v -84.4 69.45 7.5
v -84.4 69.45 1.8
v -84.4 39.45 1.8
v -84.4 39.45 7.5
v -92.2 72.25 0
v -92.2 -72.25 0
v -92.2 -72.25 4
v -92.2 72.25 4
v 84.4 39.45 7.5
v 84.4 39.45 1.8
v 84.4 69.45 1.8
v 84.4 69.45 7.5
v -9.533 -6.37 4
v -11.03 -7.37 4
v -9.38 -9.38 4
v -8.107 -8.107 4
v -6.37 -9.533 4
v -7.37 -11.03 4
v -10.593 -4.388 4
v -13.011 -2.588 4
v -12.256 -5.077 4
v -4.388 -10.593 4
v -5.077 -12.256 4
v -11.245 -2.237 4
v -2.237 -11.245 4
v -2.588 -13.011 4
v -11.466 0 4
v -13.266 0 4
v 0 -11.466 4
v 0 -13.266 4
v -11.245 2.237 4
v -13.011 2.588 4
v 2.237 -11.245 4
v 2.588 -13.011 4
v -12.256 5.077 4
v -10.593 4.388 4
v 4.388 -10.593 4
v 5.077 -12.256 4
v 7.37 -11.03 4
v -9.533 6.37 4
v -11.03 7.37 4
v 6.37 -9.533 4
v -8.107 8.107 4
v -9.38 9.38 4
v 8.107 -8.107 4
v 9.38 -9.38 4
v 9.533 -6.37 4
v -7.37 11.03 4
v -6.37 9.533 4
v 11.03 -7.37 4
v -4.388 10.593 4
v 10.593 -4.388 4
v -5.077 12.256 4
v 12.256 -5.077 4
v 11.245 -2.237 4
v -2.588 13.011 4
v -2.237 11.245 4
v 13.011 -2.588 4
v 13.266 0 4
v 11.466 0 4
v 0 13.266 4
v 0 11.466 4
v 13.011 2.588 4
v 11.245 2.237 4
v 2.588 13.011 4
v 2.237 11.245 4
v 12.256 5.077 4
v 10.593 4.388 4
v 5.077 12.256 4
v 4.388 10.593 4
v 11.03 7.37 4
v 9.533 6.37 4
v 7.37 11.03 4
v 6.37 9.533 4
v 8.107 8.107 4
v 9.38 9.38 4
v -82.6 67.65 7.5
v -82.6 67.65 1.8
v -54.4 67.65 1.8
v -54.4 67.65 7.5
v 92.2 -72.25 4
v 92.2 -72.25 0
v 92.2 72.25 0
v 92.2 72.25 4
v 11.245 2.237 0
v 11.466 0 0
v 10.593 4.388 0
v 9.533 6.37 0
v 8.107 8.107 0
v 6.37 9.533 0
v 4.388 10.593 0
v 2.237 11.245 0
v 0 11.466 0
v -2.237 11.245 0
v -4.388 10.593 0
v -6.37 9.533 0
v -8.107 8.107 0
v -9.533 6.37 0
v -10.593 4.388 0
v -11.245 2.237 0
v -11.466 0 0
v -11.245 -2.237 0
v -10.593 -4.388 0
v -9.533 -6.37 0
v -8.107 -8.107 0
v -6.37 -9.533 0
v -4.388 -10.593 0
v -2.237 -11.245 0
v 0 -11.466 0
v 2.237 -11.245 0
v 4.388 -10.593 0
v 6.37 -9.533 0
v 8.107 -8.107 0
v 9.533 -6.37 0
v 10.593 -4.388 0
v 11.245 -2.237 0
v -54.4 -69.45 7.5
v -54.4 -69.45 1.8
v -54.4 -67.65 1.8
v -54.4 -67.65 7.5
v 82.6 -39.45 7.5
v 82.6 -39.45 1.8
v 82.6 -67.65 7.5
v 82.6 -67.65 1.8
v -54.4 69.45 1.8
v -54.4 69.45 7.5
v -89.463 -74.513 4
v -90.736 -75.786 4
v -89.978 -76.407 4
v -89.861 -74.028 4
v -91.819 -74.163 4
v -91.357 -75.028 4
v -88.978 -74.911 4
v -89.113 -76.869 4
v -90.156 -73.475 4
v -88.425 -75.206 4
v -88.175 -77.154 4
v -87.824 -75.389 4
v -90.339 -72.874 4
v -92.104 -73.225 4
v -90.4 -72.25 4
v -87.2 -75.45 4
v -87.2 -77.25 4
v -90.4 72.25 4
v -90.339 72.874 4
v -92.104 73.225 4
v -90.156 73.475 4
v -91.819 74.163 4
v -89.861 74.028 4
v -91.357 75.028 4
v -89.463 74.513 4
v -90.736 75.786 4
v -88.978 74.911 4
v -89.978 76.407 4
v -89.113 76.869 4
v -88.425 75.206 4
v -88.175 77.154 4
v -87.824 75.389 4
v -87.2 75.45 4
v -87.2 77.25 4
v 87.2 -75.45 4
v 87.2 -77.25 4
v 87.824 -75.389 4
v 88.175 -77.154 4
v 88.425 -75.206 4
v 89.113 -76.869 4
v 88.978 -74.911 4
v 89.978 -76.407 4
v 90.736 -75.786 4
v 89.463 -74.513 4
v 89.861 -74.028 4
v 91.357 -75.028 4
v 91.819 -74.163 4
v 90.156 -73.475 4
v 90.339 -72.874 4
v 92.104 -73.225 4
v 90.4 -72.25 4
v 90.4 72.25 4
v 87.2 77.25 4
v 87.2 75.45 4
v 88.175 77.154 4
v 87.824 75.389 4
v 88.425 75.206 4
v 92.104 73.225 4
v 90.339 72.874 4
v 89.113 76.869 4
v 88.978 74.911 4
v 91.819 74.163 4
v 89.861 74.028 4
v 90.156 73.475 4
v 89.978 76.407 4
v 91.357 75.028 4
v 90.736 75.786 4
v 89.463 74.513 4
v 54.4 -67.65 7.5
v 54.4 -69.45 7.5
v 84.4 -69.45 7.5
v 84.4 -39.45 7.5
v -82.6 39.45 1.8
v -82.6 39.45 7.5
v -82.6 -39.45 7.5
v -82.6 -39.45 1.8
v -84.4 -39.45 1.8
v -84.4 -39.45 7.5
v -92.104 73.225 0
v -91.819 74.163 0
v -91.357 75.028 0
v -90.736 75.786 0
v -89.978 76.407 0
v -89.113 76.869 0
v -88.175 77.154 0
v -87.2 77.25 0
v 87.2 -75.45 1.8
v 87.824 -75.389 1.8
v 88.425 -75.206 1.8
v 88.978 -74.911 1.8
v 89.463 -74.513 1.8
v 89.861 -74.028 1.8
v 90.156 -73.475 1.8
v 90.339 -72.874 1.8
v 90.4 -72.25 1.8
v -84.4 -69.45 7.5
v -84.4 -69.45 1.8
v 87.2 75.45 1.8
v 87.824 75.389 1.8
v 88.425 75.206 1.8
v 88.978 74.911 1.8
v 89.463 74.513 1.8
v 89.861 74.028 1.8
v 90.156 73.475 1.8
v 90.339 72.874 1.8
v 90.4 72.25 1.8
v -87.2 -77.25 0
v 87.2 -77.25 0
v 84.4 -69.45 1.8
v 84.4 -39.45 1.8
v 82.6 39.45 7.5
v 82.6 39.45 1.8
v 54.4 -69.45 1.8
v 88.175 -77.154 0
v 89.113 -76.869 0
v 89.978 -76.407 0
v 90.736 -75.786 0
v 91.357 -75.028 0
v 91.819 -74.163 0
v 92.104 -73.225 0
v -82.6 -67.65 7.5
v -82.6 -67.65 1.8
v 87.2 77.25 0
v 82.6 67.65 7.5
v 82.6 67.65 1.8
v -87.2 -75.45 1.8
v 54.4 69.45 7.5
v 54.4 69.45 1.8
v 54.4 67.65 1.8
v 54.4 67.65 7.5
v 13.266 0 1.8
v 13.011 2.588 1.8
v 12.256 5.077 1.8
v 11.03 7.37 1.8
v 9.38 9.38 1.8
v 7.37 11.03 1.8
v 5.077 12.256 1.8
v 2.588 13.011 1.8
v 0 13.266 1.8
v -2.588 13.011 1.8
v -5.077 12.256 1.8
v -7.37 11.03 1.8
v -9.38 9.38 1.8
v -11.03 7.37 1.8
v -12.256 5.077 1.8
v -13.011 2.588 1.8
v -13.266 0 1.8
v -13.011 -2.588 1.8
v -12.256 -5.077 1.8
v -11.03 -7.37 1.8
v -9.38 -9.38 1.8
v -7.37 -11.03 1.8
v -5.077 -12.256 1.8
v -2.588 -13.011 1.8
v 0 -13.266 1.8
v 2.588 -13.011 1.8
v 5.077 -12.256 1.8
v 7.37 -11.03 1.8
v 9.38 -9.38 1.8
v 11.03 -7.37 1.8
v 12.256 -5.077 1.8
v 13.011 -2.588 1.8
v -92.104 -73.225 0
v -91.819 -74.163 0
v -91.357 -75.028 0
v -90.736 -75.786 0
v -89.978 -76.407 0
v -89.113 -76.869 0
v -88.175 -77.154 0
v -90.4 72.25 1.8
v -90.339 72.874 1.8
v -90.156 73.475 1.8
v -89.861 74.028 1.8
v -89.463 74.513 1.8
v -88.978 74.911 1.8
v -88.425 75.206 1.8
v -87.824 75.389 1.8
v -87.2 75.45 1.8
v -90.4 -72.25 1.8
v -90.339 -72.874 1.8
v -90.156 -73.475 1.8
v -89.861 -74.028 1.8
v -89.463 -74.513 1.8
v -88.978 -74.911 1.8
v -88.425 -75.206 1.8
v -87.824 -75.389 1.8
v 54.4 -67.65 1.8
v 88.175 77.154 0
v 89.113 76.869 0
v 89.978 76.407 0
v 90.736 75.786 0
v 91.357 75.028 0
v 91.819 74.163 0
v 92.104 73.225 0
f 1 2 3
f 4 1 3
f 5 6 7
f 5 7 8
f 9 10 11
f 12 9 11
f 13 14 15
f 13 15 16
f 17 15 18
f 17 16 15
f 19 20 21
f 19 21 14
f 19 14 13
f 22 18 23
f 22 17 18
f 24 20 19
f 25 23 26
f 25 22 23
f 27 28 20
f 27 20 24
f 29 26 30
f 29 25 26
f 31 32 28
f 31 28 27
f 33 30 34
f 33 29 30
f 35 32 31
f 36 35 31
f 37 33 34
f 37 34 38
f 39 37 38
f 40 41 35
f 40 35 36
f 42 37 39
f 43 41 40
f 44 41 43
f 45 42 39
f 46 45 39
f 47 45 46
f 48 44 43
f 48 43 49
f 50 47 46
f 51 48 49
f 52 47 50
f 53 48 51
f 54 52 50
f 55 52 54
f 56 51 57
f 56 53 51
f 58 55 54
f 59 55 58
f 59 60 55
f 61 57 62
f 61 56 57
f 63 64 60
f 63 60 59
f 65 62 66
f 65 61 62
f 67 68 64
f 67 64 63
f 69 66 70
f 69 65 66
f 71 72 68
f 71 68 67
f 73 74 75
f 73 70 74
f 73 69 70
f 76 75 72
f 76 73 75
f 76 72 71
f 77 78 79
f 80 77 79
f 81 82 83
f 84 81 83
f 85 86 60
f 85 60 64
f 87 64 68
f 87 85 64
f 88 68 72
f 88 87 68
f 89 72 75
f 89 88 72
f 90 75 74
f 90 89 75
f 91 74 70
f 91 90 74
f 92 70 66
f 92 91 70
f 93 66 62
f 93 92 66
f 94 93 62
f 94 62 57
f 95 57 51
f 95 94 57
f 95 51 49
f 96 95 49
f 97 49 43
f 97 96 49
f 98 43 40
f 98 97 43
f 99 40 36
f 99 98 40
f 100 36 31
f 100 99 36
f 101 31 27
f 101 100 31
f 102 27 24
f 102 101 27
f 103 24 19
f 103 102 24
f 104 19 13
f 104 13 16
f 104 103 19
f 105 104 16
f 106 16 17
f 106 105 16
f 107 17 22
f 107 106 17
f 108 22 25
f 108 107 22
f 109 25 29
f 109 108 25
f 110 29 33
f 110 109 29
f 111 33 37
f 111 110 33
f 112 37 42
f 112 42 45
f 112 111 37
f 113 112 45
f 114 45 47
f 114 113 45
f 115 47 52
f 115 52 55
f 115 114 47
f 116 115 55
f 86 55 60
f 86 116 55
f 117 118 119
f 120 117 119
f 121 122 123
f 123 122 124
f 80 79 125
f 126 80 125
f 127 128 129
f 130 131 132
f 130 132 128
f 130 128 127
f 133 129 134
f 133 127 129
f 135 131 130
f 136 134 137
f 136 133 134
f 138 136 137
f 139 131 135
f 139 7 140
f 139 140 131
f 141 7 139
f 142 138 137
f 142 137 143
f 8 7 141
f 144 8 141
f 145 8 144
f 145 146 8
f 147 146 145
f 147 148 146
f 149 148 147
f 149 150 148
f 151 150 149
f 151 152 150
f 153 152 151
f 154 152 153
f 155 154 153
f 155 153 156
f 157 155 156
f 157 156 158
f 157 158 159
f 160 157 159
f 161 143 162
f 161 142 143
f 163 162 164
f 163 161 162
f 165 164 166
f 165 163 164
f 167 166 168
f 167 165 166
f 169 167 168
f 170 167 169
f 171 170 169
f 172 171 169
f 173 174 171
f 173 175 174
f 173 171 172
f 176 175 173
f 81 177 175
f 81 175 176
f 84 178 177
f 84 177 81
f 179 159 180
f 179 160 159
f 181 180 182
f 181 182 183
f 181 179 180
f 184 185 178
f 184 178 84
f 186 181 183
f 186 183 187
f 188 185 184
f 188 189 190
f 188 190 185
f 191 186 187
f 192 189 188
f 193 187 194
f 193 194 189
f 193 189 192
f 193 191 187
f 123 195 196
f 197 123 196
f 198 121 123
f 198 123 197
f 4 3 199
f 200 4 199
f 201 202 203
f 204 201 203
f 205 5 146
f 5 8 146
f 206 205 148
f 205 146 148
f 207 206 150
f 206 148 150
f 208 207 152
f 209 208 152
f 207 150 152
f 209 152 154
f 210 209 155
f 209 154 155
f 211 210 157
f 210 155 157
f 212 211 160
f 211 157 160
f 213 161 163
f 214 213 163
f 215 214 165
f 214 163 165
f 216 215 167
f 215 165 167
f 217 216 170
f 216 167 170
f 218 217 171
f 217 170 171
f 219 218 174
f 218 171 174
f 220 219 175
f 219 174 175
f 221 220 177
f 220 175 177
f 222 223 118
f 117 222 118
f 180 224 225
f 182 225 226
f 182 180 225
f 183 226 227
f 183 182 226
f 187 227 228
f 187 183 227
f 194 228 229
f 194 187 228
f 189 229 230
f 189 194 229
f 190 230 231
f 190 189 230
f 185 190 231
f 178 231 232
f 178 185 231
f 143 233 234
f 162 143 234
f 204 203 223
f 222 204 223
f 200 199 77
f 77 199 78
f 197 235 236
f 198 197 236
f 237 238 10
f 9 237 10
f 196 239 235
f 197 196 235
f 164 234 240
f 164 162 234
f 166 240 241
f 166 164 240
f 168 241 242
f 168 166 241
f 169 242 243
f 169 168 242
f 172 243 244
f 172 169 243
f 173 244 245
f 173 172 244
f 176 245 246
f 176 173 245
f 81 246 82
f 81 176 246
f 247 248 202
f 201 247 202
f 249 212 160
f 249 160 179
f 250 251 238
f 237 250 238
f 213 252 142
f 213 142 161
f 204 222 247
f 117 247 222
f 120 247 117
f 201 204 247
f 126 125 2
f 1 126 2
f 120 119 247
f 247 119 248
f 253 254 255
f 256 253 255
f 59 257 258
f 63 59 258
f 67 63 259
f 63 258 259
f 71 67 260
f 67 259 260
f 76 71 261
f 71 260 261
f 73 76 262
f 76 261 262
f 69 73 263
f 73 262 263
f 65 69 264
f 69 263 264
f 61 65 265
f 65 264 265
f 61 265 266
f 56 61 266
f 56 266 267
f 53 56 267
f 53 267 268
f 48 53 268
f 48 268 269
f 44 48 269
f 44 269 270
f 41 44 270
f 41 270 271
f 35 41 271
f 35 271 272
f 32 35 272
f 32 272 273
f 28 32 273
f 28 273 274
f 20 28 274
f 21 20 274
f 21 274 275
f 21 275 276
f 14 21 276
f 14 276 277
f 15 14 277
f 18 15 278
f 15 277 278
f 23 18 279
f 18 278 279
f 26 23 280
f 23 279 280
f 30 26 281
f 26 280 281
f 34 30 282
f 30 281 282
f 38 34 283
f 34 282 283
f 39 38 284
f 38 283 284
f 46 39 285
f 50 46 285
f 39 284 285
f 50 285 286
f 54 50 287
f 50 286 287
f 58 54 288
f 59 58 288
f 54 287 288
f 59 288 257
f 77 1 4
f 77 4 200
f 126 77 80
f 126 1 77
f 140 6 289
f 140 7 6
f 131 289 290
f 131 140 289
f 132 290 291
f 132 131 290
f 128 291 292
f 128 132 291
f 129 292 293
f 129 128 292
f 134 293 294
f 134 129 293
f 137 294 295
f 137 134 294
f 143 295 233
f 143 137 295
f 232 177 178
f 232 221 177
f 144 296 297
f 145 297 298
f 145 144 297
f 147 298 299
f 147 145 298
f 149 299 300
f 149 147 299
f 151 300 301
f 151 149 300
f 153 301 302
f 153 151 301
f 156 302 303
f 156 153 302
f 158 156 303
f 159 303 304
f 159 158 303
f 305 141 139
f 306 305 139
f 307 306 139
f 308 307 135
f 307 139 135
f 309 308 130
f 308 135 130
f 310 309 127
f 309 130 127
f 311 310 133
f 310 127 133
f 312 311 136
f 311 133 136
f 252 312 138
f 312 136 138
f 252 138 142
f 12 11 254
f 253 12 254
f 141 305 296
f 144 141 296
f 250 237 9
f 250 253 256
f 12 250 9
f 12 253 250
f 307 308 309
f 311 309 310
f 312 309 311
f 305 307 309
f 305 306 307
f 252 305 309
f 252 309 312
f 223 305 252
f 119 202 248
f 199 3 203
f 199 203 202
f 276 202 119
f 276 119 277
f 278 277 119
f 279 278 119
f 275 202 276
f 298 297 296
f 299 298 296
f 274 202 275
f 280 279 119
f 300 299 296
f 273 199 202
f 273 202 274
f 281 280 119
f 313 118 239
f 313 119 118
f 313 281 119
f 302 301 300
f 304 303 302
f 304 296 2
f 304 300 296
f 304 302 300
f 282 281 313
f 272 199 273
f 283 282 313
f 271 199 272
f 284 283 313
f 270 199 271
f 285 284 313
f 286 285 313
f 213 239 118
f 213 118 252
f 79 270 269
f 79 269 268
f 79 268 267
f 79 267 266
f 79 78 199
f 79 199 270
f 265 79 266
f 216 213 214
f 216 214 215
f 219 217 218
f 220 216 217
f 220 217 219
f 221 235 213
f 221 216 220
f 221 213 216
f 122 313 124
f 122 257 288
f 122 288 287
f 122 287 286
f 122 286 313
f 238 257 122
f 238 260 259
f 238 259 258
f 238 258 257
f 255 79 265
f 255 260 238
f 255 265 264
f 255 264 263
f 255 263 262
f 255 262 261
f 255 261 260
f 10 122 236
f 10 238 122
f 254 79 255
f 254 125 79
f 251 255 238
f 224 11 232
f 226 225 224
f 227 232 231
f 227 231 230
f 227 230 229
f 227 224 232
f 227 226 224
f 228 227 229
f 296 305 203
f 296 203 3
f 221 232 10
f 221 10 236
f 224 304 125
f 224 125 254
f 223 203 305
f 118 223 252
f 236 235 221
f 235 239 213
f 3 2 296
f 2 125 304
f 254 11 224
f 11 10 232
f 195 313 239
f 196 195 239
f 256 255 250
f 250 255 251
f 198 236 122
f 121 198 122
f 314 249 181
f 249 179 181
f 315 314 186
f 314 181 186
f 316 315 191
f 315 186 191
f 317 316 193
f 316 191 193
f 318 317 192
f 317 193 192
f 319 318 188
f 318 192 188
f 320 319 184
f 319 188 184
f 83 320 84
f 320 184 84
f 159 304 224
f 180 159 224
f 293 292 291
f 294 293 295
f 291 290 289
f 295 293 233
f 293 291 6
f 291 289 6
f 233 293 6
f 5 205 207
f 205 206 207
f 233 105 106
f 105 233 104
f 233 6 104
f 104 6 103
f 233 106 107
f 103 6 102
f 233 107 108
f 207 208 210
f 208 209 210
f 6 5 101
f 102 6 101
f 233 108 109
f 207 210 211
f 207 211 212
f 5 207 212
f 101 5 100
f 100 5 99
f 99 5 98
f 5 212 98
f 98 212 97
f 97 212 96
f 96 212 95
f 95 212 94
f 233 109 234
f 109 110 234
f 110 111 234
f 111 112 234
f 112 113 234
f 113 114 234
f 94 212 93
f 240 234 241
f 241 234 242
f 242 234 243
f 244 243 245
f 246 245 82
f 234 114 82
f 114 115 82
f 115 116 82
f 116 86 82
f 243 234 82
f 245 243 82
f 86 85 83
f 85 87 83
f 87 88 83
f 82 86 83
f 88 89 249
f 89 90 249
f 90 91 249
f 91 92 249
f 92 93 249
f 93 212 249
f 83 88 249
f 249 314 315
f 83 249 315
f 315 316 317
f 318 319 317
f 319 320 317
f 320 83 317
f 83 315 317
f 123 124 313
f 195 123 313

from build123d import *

# Parameters (mm, degrees)
F0_W     = 184.4
F0_H     = 154.5
F0_R     = 11.46558
F1_DEPTH = 4
F2_R     = 5
F3_T     = -1.8
F5_DEPTH = 5.7


with BuildPart() as f1:
    # F0 (on Top) → F1 (new body)
    with BuildSketch(Plane.XY):
        Rectangle(F0_W, F0_H)
        Circle(F0_R, mode=Mode.SUBTRACT)
    extrude(amount=F1_DEPTH)

    # F2
    f2_edges = [f1.edges().sort_by_distance(p)[0] for p in [
        (-92.2, -77.25, 2),
        (-92.2, 77.25, 2),
        (92.2, -77.25, 2),
        (92.2, 77.25, 2),
    ]]
    fillet(f2_edges, radius=F2_R)

    # F3
    f3_openings = [f1.faces().sort_by_distance(p)[0] for p in [
        (0, 74.844307, 4),
    ]]
    offset(amount=F3_T, openings=f3_openings)

    # F4 (on face) → F5 (join)
    with BuildSketch(Plane.XY.offset(1.8)):
        Polygon((-84.4, -39.45), (-84.4, -69.45), (-54.4, -69.45), (-54.4, -67.65), (-82.6, -67.65), (-82.6, -39.45), align=None)
        Polygon((-82.6, 67.65), (-54.4, 67.65), (-54.4, 69.45), (-84.4, 69.45), (-84.4, 39.45), (-82.6, 39.45), align=None)
        Polygon((84.4, -69.45), (84.4, -39.45), (82.6, -39.45), (82.6, -67.65), (54.4, -67.65), (54.4, -69.45), align=None)
        Polygon((82.6, 39.45), (84.4, 39.45), (84.4, 69.45), (54.4, 69.45), (54.4, 67.65), (82.6, 67.65), align=None)
    extrude(amount=F5_DEPTH)


solid = f1.part
